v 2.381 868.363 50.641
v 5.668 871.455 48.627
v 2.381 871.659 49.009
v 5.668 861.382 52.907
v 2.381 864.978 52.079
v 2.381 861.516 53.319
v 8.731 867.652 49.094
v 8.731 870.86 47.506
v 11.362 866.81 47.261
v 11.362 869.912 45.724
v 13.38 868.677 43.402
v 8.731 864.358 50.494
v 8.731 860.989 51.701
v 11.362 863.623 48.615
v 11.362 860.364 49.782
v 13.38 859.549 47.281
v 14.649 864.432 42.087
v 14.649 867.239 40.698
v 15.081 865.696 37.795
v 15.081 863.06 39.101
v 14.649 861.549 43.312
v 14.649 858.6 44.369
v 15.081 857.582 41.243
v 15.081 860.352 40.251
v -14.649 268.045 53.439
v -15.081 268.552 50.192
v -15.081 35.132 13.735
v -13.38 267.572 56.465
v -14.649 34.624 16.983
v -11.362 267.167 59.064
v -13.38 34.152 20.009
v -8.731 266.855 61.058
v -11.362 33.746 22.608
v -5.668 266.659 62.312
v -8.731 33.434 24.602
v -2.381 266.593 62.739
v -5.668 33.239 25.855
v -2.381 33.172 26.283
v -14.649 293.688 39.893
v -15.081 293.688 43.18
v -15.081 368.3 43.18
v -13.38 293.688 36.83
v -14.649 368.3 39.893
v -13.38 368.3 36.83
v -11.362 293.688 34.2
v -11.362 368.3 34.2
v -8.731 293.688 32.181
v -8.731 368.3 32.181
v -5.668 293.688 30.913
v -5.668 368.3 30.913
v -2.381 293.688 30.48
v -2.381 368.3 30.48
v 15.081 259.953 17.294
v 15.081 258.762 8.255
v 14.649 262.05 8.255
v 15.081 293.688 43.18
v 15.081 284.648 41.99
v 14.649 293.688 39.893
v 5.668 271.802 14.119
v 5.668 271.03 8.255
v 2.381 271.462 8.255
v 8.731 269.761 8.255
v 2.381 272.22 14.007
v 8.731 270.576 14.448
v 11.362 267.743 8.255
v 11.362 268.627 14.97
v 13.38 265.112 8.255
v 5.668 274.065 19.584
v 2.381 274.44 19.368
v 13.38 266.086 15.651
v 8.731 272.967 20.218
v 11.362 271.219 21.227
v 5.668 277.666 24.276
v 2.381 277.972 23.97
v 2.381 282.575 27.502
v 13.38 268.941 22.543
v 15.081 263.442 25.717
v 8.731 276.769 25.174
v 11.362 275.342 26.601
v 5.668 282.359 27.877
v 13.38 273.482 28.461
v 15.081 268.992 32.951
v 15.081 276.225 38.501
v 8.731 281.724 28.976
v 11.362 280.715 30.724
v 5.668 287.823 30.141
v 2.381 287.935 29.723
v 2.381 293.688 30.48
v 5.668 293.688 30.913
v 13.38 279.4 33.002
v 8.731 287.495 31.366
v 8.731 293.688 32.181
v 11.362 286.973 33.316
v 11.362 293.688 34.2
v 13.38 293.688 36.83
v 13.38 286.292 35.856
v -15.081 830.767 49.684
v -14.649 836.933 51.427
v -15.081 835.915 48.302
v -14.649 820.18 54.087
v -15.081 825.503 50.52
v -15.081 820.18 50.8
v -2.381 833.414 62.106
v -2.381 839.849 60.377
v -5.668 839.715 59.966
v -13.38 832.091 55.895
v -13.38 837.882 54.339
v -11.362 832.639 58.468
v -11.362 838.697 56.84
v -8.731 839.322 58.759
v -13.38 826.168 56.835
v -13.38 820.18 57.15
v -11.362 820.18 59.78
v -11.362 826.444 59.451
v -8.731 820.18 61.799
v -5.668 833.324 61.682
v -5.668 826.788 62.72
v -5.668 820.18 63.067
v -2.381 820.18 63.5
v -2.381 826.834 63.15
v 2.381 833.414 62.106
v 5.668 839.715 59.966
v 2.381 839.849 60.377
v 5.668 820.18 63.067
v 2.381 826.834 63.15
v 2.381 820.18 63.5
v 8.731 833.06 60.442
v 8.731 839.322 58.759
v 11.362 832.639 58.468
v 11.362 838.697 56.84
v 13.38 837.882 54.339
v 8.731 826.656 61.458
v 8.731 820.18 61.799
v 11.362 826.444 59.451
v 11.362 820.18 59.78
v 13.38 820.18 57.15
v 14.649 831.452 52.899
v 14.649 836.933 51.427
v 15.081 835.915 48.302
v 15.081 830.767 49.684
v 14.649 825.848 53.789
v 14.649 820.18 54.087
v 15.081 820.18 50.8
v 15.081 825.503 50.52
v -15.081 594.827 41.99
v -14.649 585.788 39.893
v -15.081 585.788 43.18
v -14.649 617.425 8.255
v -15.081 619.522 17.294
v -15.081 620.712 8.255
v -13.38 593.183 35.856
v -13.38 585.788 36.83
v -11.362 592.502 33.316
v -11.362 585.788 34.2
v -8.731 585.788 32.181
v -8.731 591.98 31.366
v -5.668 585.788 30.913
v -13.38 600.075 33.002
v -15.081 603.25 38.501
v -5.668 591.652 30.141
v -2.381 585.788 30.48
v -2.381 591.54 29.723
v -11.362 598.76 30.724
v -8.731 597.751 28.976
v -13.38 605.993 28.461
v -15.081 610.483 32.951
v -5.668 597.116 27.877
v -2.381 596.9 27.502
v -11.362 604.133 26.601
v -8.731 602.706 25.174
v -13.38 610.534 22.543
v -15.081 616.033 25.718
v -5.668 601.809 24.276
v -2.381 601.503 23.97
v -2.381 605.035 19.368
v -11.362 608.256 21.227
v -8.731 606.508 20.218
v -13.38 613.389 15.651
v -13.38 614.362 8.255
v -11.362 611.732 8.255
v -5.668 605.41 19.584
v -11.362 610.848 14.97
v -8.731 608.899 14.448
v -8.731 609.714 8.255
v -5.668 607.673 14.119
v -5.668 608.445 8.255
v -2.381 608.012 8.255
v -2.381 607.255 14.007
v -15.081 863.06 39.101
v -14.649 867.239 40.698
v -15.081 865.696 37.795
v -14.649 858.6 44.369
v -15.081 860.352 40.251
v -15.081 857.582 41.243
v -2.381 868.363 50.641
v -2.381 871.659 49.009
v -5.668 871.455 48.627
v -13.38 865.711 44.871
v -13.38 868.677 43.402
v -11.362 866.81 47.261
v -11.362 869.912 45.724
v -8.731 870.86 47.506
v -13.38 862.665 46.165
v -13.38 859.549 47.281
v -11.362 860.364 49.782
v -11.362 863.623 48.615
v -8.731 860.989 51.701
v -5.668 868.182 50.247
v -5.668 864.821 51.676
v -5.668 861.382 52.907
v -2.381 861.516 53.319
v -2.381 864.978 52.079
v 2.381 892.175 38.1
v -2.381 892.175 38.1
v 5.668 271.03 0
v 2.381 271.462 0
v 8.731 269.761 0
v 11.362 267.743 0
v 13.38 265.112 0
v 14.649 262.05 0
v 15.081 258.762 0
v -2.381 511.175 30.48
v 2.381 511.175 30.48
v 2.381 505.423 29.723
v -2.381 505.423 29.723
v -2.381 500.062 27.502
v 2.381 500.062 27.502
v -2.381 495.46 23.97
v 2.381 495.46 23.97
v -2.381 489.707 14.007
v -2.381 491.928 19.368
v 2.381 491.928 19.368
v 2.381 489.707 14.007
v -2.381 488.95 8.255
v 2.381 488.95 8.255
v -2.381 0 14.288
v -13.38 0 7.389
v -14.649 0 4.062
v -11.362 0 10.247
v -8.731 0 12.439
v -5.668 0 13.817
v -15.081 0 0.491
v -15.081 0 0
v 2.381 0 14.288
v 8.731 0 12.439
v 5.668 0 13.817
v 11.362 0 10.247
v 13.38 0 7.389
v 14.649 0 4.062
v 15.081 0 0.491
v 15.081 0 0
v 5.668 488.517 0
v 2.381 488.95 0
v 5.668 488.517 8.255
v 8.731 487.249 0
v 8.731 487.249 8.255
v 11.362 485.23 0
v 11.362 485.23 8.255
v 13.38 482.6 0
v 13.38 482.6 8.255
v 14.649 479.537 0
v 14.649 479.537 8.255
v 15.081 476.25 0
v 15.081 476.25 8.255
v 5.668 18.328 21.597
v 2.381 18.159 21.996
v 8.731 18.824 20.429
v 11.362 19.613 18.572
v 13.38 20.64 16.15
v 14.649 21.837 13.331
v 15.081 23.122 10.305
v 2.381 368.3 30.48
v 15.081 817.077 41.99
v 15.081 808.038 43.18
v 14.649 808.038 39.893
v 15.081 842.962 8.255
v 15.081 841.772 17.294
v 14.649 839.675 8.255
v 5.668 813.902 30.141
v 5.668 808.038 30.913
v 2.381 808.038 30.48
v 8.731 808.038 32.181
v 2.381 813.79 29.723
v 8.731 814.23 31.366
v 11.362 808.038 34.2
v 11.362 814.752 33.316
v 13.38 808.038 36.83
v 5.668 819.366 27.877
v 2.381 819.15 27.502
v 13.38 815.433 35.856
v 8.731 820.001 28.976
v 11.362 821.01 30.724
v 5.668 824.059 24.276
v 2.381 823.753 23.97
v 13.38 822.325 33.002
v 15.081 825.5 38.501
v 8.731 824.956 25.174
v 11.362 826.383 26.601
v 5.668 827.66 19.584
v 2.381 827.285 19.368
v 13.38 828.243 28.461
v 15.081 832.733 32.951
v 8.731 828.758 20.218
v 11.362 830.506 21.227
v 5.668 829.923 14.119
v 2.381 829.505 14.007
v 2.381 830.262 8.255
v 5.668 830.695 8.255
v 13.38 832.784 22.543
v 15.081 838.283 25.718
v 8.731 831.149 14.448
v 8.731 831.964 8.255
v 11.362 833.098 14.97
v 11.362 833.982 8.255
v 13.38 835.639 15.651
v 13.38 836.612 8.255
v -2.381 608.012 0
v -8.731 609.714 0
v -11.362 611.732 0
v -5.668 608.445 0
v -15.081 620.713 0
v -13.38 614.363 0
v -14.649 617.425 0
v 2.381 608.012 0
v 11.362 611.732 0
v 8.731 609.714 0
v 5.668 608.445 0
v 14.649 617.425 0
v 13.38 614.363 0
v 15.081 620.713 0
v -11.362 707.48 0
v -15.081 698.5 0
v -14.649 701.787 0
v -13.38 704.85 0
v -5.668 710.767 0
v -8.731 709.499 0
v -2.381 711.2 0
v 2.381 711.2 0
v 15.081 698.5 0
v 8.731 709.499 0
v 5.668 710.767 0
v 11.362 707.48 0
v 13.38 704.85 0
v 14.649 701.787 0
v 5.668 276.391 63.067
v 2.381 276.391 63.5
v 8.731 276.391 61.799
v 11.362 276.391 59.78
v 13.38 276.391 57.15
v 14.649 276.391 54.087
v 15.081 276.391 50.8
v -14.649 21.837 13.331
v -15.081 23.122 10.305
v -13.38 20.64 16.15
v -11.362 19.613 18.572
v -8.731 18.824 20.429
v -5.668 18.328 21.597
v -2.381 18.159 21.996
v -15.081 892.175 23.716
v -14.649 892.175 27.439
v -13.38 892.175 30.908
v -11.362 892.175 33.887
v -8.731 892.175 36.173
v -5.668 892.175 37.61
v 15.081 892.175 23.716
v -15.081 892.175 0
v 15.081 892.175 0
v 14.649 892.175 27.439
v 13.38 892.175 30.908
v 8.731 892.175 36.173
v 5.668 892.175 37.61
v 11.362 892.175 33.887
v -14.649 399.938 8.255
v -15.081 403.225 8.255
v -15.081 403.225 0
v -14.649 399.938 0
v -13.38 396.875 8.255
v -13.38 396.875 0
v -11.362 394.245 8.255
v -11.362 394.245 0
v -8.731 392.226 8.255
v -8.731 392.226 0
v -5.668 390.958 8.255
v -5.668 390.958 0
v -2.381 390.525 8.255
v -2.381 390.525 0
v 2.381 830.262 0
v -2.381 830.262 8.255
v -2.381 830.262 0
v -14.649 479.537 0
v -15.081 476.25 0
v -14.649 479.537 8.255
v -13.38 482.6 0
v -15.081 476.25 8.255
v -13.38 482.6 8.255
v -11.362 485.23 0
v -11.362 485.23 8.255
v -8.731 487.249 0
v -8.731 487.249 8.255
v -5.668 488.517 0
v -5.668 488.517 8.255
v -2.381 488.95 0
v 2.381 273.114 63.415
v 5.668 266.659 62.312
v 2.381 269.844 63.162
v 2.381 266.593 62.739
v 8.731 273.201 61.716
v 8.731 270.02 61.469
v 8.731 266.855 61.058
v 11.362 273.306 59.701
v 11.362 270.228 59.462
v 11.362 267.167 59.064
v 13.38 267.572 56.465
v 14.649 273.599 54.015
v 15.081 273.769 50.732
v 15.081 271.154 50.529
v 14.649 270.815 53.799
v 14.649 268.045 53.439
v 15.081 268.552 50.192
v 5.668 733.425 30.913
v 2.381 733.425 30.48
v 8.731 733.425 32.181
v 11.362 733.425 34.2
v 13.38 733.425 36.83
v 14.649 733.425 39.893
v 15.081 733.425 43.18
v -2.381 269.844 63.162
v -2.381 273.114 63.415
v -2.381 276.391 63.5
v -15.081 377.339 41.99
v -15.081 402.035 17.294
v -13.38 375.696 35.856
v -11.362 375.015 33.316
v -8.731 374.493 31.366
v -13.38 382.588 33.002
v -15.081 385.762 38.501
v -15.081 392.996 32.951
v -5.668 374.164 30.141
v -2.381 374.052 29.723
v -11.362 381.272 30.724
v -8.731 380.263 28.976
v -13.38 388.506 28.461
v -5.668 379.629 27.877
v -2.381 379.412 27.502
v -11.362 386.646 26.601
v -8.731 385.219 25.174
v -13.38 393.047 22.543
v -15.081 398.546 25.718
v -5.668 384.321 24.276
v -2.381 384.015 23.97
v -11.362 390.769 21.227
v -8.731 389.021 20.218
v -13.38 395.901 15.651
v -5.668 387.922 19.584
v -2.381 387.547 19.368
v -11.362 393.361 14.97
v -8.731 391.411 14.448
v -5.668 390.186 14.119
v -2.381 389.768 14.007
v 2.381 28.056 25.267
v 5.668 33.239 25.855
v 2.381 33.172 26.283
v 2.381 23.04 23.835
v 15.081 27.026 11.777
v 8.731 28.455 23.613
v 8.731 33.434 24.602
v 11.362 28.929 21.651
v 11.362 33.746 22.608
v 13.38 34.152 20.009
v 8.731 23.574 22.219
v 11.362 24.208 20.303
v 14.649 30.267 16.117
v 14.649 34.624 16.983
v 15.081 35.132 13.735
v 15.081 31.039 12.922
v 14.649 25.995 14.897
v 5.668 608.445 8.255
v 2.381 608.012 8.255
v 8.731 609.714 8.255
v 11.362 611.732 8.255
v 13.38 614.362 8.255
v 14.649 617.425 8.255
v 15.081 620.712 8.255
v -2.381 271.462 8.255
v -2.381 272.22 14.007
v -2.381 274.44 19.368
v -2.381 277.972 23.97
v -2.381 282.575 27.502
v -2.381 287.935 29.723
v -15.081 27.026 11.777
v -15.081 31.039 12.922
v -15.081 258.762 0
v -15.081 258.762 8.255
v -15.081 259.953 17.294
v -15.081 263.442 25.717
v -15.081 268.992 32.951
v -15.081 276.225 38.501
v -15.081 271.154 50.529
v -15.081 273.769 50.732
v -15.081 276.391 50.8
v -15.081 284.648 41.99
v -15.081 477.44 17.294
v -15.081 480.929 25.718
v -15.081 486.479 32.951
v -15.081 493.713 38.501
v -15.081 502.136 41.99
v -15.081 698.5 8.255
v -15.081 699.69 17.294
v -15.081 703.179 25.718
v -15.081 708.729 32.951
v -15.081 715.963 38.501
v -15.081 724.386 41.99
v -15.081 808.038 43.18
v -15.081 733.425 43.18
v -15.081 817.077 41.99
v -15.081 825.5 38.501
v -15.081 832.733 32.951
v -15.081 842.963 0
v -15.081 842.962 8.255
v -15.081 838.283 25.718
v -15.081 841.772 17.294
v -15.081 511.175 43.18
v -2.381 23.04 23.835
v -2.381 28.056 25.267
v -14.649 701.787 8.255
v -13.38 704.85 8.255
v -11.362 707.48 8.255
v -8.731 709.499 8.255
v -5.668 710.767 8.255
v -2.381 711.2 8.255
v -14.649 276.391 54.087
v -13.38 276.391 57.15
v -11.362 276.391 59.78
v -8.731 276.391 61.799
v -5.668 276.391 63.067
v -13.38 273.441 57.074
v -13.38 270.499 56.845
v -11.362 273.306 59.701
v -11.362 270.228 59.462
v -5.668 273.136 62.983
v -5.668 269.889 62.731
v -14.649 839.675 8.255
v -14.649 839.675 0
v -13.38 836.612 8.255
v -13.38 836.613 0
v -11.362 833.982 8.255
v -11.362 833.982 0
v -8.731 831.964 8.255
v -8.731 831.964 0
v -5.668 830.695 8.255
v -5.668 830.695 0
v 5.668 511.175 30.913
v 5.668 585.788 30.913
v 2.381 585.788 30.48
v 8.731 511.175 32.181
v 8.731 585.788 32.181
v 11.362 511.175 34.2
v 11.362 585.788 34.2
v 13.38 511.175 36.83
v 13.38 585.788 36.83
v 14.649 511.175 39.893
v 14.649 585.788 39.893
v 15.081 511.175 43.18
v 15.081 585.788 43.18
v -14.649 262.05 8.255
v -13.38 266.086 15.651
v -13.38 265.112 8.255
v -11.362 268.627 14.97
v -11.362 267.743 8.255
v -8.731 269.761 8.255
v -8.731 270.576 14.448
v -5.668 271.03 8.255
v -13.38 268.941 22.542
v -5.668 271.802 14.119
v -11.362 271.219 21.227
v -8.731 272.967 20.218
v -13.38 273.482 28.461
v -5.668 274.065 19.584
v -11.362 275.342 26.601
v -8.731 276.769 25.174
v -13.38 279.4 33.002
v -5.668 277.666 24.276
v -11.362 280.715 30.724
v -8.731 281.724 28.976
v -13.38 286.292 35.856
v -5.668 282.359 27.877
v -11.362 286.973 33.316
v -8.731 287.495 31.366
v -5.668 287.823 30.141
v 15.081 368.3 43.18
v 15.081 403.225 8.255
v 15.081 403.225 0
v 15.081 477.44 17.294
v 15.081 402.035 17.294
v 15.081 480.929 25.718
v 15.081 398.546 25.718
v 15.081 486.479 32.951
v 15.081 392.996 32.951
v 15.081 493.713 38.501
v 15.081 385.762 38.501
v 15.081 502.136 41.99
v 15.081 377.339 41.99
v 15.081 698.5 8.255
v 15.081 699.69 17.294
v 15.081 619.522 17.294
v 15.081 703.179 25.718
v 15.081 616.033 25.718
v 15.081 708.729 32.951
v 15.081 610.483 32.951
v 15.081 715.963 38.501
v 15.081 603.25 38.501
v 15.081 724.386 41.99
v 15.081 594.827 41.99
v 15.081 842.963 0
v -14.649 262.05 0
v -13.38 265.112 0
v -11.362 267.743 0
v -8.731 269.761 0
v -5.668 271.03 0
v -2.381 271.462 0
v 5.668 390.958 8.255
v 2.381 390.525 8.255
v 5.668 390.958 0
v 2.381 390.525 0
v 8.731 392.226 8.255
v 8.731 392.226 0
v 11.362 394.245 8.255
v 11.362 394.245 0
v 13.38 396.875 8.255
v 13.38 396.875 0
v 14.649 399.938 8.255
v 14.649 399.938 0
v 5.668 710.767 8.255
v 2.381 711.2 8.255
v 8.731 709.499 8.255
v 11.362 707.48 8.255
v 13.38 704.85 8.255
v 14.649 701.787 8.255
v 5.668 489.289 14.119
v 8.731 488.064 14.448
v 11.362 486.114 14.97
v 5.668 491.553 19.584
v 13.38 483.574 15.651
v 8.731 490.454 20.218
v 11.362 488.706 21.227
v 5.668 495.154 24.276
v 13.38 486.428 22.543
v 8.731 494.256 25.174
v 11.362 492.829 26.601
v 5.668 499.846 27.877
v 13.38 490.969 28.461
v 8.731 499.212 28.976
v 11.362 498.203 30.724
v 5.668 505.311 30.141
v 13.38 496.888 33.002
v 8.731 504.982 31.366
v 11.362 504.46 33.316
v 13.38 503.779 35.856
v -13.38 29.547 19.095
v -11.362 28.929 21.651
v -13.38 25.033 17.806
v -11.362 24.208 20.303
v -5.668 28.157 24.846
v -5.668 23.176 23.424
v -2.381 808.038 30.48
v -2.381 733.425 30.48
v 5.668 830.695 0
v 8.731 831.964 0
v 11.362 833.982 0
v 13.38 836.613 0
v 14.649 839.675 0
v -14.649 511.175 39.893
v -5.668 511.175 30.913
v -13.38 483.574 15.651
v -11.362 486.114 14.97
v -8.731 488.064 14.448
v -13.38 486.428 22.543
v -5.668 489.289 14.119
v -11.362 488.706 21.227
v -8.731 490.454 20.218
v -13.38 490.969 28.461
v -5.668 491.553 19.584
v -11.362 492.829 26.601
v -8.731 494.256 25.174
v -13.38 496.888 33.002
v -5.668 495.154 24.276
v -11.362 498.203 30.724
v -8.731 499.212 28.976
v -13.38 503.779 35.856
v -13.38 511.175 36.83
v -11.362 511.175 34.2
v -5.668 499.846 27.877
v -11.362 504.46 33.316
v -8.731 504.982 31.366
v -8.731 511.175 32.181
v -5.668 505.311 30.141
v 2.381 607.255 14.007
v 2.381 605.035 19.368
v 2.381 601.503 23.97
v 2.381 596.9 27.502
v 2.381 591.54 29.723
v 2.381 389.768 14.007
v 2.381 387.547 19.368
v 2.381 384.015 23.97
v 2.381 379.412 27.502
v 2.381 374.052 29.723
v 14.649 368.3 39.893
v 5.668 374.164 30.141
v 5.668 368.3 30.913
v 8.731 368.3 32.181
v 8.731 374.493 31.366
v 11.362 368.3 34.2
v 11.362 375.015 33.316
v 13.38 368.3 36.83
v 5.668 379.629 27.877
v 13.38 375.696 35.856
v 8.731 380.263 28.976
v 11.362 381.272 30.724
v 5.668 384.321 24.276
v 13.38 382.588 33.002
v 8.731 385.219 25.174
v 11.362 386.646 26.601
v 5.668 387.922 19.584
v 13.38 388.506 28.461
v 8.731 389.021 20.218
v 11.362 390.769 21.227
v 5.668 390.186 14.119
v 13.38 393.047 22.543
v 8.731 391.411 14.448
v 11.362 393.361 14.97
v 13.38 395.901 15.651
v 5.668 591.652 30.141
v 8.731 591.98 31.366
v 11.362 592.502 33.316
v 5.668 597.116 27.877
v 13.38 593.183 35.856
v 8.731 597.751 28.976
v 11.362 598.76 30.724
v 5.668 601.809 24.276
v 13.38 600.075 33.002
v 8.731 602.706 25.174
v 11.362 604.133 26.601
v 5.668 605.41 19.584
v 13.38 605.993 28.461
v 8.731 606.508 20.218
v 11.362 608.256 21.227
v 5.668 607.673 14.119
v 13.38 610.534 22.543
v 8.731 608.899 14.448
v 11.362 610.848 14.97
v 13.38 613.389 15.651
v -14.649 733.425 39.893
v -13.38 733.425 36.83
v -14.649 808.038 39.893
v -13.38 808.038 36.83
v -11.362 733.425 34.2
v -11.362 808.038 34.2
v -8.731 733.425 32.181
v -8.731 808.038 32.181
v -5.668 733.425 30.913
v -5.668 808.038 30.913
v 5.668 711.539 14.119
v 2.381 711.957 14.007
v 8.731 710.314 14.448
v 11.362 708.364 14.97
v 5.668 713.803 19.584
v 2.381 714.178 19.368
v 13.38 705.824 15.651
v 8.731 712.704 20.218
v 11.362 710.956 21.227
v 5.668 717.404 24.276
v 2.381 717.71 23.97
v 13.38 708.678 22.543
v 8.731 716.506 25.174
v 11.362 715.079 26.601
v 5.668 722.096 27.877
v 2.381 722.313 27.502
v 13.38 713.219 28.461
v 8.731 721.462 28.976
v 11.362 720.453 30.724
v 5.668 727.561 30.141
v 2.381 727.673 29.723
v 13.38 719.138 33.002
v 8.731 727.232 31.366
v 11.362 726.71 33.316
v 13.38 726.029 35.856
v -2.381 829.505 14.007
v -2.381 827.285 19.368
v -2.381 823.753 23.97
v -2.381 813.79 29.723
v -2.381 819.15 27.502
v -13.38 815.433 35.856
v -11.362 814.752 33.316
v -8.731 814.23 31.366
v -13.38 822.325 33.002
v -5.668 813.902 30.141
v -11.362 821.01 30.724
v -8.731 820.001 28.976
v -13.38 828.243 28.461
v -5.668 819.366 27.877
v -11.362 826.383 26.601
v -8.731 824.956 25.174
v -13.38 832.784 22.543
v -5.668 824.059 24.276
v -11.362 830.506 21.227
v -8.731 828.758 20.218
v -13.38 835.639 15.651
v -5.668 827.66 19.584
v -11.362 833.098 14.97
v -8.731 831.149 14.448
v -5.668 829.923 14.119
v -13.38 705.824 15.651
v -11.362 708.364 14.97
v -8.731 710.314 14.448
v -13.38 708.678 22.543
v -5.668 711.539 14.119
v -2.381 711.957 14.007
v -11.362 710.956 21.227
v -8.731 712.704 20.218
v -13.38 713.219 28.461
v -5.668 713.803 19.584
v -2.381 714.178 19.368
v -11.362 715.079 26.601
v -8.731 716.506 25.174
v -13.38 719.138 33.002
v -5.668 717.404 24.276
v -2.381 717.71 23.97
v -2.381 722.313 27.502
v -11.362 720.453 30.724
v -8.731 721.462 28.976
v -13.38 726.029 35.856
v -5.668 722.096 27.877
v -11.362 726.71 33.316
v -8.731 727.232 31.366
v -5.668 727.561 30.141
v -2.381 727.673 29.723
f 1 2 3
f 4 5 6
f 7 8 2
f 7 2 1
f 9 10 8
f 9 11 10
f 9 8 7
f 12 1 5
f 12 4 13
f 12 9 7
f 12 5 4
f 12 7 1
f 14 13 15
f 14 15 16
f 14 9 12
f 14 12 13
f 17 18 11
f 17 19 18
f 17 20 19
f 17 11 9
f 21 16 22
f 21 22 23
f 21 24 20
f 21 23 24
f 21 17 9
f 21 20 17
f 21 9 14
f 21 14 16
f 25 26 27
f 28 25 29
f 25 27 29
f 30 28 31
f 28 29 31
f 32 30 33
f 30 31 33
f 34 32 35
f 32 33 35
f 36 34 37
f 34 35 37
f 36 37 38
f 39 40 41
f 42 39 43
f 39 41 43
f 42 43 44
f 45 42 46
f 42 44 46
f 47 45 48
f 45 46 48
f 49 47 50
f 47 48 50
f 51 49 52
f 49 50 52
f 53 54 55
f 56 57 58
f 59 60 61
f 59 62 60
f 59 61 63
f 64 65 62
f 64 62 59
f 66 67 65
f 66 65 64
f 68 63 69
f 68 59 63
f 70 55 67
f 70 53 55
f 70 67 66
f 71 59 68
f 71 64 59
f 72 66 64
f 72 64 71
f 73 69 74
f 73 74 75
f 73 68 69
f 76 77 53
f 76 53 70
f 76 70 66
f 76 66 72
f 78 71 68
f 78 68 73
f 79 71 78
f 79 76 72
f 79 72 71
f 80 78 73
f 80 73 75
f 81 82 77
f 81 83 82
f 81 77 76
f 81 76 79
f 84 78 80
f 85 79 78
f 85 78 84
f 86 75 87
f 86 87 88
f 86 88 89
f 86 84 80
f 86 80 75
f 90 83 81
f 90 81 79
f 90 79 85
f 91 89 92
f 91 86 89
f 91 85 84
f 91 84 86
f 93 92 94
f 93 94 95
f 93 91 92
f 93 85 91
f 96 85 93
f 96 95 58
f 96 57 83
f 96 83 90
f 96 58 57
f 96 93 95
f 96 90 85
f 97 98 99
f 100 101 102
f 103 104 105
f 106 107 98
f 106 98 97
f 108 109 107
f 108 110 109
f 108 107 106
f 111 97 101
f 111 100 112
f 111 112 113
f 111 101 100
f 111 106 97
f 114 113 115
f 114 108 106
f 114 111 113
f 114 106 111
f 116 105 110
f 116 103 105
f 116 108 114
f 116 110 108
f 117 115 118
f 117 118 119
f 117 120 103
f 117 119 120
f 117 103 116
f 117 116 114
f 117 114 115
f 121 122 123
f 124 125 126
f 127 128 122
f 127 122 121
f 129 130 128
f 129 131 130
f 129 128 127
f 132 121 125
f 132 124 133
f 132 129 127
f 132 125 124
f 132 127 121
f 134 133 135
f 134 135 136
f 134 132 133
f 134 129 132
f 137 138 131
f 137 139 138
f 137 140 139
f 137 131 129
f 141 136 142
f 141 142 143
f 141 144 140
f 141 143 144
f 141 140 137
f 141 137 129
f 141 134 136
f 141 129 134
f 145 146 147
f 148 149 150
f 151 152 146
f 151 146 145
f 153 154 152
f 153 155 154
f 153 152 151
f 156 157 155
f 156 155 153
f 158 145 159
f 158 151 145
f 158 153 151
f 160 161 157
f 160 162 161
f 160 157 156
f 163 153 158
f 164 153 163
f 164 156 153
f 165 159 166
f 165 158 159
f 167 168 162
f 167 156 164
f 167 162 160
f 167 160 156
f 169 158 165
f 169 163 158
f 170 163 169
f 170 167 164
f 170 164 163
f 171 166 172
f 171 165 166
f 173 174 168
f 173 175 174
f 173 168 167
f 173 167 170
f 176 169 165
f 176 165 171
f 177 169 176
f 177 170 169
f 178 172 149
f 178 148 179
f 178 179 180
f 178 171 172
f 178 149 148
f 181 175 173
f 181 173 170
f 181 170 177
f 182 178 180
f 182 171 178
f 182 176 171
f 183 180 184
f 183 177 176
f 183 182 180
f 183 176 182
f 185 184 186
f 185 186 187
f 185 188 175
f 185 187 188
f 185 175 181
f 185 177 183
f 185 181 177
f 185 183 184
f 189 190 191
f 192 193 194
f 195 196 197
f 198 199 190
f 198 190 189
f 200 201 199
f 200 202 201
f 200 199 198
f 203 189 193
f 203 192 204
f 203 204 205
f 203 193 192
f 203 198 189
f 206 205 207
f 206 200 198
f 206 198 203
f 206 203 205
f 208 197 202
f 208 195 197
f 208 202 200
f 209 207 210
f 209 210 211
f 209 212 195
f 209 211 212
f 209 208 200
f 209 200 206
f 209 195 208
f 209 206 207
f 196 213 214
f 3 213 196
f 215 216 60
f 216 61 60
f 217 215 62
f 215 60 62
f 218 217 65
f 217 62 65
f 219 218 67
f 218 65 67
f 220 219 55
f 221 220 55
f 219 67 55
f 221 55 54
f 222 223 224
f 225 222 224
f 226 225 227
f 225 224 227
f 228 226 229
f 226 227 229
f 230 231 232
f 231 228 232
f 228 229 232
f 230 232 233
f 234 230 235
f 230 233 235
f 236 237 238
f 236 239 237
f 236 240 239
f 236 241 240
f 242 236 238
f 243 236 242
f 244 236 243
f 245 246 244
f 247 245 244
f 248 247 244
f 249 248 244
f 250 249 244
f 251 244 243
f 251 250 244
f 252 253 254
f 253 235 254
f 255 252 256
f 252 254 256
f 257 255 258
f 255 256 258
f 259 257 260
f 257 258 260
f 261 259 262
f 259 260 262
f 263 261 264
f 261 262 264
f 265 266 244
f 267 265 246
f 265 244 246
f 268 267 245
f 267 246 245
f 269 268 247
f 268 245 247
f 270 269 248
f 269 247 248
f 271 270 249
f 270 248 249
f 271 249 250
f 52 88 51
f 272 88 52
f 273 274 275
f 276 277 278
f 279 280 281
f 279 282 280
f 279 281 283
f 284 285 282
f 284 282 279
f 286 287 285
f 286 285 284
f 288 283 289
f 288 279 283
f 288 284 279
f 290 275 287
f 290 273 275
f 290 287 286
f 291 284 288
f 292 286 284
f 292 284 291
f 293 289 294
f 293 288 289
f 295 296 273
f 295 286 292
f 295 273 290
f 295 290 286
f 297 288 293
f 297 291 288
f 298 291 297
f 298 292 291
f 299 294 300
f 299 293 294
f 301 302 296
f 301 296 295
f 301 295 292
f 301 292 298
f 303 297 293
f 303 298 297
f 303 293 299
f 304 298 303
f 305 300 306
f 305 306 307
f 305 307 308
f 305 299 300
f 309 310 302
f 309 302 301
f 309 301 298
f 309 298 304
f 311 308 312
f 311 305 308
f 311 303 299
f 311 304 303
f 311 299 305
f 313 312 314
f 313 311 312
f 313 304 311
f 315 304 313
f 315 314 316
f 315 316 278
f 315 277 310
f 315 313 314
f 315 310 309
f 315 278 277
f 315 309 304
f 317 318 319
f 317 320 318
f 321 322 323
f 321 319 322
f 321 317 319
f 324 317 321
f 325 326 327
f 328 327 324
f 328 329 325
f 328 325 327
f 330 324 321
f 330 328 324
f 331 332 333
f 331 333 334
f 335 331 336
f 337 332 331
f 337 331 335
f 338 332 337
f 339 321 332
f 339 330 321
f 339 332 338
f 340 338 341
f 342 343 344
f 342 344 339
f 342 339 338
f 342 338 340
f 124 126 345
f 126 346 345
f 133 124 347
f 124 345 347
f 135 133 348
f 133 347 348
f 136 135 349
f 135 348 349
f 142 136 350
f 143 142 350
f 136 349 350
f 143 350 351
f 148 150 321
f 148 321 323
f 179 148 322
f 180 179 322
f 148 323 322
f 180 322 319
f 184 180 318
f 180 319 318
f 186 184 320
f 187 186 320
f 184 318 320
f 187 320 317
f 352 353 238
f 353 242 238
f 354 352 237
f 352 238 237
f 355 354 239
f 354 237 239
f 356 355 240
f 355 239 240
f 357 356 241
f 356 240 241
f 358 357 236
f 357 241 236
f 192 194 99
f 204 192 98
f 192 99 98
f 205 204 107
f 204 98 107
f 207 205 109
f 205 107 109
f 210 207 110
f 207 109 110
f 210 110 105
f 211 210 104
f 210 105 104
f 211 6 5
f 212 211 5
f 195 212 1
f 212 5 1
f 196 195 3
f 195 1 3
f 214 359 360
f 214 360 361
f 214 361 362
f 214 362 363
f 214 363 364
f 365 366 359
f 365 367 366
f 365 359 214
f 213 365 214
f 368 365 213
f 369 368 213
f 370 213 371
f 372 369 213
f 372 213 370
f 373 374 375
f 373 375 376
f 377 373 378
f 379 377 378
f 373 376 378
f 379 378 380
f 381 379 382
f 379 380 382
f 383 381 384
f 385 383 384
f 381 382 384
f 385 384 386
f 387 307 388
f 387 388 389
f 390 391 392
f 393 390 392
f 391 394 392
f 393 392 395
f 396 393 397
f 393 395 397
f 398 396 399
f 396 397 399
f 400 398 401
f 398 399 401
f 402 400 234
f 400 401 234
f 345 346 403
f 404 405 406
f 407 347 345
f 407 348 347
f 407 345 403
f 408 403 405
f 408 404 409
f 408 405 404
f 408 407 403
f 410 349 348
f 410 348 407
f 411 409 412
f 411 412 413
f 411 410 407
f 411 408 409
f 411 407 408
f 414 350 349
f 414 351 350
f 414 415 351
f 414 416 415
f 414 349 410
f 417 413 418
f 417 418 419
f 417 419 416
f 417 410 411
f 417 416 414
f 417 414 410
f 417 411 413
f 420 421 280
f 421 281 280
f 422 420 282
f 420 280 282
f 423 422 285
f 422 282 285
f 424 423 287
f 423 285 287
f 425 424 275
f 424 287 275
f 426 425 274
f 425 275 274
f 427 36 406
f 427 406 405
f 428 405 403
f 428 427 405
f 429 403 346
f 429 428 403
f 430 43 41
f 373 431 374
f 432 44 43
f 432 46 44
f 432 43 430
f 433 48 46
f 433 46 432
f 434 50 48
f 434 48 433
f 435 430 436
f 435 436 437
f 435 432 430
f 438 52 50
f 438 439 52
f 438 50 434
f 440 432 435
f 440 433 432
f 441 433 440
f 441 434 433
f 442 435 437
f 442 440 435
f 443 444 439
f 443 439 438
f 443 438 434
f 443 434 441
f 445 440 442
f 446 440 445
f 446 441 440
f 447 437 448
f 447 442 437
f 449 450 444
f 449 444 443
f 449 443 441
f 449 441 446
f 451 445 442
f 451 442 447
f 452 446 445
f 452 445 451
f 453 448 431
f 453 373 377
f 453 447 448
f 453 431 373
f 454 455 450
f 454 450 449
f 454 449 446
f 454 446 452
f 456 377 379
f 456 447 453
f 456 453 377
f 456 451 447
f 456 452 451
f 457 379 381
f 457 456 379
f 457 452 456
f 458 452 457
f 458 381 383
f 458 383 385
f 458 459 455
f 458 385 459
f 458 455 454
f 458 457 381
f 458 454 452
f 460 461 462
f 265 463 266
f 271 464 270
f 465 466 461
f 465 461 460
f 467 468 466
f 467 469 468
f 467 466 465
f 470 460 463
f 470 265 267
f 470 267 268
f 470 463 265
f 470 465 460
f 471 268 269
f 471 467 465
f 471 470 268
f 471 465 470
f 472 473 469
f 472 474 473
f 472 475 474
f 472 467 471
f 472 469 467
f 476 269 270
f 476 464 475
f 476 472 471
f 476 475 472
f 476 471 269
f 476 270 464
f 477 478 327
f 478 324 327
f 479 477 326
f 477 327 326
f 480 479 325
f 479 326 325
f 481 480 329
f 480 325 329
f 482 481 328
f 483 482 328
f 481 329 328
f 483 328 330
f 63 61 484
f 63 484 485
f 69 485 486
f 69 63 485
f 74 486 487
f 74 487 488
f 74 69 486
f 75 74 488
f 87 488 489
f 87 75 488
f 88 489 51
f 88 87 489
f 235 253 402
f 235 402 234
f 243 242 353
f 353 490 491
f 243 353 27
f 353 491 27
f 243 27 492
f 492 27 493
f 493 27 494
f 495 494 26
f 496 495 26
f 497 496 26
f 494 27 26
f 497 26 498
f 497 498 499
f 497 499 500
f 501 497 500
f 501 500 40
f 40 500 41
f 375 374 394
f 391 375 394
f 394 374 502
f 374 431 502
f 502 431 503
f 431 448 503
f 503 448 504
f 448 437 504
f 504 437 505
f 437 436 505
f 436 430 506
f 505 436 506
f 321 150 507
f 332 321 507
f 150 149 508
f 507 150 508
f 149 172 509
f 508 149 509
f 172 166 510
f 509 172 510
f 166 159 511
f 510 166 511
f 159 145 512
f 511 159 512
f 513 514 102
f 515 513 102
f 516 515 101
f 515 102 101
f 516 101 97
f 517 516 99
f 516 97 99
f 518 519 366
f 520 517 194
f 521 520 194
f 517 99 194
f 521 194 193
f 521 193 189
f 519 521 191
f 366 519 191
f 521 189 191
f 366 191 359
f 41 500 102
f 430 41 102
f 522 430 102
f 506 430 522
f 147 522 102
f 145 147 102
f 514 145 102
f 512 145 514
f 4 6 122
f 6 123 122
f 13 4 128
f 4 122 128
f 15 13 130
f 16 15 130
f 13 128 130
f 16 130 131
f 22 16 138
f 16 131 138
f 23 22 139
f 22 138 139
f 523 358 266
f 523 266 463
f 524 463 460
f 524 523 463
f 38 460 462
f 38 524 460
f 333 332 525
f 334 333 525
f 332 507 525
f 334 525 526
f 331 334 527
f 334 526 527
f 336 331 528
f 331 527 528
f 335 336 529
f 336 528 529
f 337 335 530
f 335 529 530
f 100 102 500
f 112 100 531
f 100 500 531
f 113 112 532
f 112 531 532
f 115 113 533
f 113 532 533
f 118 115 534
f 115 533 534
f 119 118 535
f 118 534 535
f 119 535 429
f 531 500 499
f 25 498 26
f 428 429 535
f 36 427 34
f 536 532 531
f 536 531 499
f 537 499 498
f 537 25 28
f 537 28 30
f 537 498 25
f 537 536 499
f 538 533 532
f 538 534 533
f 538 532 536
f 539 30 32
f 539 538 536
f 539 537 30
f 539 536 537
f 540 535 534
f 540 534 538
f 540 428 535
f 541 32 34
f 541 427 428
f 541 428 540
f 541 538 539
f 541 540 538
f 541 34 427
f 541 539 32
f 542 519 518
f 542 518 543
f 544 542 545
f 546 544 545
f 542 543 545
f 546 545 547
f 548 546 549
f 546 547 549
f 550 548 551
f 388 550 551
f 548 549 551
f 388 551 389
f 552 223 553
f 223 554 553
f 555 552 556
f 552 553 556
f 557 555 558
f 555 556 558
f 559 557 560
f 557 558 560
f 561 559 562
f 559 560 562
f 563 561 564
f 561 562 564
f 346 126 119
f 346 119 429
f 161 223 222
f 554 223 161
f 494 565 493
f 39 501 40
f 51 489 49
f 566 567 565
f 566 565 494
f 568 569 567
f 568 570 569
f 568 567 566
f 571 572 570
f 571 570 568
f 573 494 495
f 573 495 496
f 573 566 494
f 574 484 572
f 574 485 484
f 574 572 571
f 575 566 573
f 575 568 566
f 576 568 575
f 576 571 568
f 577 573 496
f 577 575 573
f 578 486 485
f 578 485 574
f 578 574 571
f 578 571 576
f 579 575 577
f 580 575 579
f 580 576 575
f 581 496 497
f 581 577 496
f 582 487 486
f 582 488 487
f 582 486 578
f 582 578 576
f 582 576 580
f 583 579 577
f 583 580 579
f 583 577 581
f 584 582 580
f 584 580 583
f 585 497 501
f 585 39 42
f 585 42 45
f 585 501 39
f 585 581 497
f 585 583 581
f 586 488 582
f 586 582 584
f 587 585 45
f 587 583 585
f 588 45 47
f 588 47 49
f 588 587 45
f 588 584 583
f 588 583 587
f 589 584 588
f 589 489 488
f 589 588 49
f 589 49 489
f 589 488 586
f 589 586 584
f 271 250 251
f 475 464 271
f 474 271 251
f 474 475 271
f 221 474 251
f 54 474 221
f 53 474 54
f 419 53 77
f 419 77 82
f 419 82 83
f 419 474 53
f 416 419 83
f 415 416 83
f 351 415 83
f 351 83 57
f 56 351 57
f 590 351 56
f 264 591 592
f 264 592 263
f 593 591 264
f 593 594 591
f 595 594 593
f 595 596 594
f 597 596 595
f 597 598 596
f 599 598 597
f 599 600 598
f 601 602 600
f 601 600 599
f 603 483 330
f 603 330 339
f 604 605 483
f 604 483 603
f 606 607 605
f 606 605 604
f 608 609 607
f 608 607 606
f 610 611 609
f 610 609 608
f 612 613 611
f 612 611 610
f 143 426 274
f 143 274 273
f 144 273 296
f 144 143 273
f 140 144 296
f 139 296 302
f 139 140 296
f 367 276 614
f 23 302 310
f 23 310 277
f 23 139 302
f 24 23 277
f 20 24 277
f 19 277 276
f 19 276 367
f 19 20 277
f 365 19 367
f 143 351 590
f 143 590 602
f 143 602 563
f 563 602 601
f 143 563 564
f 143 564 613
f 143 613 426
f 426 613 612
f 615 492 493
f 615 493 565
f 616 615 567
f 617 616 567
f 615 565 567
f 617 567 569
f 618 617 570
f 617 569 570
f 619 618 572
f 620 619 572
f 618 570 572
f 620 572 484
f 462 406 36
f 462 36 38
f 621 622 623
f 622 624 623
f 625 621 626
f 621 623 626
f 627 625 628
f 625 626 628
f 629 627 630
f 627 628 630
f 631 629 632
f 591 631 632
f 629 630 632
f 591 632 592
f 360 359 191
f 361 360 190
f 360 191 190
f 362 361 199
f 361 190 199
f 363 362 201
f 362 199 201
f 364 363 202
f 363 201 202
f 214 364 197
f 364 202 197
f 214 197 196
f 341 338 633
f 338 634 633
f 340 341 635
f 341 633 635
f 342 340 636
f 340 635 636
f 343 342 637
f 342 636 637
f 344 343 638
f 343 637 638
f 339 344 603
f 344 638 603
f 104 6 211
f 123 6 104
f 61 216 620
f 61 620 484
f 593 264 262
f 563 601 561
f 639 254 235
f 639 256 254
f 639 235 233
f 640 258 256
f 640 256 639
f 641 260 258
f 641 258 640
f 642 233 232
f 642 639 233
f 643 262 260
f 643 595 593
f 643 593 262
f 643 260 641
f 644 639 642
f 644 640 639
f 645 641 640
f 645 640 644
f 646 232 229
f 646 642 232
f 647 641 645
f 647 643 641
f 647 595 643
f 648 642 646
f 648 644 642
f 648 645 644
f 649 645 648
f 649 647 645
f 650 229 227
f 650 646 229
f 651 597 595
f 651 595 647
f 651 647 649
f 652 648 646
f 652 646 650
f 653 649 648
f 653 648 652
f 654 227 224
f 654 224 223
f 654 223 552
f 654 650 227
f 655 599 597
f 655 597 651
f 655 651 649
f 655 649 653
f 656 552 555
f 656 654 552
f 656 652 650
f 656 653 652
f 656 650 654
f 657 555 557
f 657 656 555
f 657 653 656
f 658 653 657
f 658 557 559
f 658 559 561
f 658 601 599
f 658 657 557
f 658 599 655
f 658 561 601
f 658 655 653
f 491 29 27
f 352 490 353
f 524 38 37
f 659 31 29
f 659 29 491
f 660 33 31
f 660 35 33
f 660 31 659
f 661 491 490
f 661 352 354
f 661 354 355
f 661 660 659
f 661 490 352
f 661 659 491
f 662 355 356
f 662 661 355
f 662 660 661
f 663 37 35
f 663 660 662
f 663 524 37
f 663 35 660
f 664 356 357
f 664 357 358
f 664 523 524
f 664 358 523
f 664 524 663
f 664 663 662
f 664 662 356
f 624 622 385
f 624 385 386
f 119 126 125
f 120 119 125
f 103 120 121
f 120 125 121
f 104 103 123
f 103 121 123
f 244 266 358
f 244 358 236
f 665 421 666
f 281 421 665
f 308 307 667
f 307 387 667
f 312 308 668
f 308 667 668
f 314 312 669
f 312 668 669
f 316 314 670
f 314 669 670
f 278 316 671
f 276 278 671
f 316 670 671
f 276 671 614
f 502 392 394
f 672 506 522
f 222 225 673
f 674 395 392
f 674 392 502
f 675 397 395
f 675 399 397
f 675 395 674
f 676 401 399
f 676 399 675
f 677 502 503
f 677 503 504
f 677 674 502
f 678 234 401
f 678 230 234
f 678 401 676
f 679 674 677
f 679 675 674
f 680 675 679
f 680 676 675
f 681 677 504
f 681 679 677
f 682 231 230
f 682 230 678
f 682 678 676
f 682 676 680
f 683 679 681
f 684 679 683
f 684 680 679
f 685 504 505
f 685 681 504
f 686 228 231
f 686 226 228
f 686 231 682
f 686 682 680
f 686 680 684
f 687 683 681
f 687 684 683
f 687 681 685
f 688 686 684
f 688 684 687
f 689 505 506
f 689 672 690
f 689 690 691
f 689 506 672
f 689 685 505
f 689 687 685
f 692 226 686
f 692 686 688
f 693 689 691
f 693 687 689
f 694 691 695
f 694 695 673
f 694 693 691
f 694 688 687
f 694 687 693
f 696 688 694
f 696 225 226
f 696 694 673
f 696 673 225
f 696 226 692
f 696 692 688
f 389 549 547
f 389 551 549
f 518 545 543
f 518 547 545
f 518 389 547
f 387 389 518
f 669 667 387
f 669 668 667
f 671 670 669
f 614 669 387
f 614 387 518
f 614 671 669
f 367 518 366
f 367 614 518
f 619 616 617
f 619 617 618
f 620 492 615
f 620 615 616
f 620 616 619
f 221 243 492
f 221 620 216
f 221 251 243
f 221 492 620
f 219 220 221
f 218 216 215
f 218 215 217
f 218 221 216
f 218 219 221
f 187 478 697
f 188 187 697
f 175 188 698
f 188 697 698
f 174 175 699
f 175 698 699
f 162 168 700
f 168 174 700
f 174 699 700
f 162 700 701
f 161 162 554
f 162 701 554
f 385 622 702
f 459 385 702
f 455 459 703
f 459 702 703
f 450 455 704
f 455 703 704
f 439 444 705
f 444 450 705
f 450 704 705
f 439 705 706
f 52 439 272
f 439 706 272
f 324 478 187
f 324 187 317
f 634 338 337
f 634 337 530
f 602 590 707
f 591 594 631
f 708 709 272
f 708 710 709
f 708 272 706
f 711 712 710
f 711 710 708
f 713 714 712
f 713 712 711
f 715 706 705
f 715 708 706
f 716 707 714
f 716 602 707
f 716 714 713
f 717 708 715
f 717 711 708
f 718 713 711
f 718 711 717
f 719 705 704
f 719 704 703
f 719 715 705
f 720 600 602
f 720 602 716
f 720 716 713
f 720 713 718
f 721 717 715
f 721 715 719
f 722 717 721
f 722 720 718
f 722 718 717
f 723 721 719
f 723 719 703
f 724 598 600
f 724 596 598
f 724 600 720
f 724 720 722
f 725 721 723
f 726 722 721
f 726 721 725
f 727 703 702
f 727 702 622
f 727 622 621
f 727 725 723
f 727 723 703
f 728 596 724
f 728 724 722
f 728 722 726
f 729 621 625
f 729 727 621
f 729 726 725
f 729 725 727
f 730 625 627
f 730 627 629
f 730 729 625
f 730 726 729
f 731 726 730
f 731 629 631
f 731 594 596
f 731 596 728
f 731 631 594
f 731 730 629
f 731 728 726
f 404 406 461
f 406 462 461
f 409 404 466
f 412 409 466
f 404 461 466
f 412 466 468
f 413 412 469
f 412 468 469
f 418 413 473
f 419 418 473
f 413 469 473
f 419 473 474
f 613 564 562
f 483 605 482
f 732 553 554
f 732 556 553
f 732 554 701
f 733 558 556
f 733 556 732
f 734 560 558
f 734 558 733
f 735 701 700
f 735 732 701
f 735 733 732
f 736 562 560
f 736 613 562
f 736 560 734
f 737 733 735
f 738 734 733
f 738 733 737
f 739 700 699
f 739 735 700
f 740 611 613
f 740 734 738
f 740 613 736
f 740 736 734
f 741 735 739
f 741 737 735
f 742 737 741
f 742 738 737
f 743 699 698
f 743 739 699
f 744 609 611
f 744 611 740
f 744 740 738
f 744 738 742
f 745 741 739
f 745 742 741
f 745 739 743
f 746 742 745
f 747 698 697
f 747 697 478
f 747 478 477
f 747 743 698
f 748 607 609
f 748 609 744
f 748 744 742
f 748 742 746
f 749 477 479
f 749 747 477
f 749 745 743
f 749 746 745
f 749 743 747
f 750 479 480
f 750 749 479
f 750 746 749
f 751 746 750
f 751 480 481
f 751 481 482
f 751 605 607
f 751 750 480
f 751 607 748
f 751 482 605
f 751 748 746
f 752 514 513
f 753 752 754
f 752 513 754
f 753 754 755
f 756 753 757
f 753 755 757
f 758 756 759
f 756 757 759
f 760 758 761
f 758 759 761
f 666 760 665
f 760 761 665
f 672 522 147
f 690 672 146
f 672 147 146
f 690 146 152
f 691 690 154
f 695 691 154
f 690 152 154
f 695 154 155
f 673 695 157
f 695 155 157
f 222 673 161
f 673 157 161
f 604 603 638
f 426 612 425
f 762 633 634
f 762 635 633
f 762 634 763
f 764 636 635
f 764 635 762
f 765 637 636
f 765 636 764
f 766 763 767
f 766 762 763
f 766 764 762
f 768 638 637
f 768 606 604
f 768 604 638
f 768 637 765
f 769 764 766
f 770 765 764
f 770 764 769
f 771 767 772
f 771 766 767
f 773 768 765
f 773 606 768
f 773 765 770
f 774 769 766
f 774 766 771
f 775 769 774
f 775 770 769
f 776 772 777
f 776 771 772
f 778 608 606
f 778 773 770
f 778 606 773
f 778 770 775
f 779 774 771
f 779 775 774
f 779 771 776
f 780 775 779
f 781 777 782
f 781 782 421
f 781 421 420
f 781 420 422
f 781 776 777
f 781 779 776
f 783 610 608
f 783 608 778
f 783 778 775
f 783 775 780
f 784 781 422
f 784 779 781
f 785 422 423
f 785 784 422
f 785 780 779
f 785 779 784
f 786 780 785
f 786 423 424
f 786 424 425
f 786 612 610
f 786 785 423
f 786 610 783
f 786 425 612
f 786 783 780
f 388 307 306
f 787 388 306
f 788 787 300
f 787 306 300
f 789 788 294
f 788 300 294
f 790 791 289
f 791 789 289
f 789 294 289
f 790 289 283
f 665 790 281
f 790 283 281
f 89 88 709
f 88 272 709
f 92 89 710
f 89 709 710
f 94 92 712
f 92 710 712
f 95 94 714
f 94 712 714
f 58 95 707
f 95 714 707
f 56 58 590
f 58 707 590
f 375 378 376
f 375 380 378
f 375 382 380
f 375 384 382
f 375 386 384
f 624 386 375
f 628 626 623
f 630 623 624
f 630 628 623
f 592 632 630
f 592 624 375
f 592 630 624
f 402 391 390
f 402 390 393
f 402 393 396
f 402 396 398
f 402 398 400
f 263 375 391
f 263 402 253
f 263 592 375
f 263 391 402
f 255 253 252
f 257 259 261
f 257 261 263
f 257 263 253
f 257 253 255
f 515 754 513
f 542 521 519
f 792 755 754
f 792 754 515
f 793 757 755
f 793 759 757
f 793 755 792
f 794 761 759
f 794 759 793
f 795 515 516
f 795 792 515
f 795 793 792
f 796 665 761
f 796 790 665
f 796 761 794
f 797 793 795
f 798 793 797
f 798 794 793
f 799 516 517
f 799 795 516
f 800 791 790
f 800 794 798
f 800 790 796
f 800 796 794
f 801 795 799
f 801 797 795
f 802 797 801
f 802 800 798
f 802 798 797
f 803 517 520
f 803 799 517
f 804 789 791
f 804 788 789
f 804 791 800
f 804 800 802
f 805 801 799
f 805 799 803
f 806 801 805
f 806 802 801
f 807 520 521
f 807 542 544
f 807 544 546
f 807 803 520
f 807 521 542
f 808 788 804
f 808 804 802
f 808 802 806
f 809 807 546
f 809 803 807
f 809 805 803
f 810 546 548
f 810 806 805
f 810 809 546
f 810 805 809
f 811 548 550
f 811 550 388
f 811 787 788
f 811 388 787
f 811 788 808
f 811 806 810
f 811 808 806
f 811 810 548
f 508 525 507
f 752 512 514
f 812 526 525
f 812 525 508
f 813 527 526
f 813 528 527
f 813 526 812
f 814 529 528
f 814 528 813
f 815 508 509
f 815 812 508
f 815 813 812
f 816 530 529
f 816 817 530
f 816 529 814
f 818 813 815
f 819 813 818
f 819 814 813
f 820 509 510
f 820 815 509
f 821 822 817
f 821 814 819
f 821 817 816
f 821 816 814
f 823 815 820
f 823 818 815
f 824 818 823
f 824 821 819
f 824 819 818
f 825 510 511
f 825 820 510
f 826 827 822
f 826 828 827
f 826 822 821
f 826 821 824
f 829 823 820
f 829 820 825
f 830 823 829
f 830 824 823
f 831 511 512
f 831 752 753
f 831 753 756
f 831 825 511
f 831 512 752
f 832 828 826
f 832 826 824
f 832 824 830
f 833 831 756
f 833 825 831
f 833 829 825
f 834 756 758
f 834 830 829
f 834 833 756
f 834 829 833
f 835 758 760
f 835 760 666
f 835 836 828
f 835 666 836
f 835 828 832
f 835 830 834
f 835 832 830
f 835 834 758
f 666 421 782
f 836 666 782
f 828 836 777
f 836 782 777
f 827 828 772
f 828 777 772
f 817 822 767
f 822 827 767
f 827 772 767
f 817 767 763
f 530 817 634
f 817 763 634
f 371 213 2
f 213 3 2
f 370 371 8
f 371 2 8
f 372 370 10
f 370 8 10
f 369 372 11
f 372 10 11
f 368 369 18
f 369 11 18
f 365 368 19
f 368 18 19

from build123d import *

# Parameters (mm, degrees)
F1_DEPTH      = 15.08125
F1_DEPTH_BACK = 15.08125
F2_R          = 63.5
F3_R          = 22.225
F4_R          = 12.7


with BuildPart() as f1:
    # F0 (on Right) → F1 (new body, two sides)
    with BuildSketch(Plane.YZ) as f1_sk:
        Polygon((0, 14.2875), (0, 0), (271.4625, 0), (271.4625, 30.48), (390.525, 30.48), (390.525, 0), (488.95, 0), (488.95, 30.48), (608.0125, 30.48), (608.0125, 0), (711.2, 0), (711.2, 30.48), (830.2625, 30.48), (830.2625, 0), (892.175, 0), (892.175, 38.1), (866.775, 51.60542), (830.2625, 63.5), (271.4625, 63.5), (25.4, 25.06916), align=None)
    extrude(amount=F1_DEPTH)
    extrude(f1_sk.sketch, amount=-F1_DEPTH_BACK)

    # F2
    f2_edges = [f1.edges().sort_by_distance(p)[0] for p in [
        (0, 25.4, 25.06916),
        (0, 271.4625, 63.5),
        (0, 830.2625, 63.5),
        (0, 866.775, 51.60542),
    ]]
    fillet(f2_edges, radius=F2_R)

    # F3
    f3_edges = [f1.edges().sort_by_distance(p)[0] for p in [
        (0, 271.4625, 30.48),
        (0, 488.95, 30.48),
        (0, 711.2, 30.48),
        (0, 390.525, 30.48),
        (0, 608.0125, 30.48),
        (0, 830.2625, 30.48),
    ]]
    fillet(f3_edges, radius=F3_R)

    # F4
    f4_edges = [f1.edges().sort_by_distance(p)[0] for p in [
        (-15.08125, 330.99375, 30.48),
        (15.08125, 330.99375, 30.48),
        (-15.08125, 548.48125, 30.48),
        (15.08125, 548.48125, 30.48),
        (-15.08125, 770.73125, 30.48),
        (15.08125, 770.73125, 30.48),
        (15.08125, 548.28579, 63.5),
        (-15.08125, 548.28579, 63.5),
    ]]
    fillet(f4_edges, radius=F4_R)


solid = f1.part
